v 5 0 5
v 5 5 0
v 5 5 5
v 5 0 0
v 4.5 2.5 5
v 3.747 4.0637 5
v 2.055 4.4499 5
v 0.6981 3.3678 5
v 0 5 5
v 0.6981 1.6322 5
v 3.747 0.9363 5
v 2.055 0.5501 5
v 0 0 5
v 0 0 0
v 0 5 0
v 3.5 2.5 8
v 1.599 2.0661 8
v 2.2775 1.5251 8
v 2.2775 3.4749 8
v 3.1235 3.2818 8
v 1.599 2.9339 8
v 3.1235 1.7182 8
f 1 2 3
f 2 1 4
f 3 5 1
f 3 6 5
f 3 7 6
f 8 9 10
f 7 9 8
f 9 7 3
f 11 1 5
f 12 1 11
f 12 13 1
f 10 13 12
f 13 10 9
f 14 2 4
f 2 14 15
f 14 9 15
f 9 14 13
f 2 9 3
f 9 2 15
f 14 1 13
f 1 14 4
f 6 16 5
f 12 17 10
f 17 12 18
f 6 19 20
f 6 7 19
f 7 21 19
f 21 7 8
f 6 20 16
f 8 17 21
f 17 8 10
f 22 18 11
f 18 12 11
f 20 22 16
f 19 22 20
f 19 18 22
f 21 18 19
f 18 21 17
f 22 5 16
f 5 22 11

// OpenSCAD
union(){
cube([5.0e0,5.0e0,5.0e0]);
translate([2.5e0,2.5e0,5.0e0])cylinder(r1 = 2.0e0,r2 = 1.0e0,3.0e0);
}
